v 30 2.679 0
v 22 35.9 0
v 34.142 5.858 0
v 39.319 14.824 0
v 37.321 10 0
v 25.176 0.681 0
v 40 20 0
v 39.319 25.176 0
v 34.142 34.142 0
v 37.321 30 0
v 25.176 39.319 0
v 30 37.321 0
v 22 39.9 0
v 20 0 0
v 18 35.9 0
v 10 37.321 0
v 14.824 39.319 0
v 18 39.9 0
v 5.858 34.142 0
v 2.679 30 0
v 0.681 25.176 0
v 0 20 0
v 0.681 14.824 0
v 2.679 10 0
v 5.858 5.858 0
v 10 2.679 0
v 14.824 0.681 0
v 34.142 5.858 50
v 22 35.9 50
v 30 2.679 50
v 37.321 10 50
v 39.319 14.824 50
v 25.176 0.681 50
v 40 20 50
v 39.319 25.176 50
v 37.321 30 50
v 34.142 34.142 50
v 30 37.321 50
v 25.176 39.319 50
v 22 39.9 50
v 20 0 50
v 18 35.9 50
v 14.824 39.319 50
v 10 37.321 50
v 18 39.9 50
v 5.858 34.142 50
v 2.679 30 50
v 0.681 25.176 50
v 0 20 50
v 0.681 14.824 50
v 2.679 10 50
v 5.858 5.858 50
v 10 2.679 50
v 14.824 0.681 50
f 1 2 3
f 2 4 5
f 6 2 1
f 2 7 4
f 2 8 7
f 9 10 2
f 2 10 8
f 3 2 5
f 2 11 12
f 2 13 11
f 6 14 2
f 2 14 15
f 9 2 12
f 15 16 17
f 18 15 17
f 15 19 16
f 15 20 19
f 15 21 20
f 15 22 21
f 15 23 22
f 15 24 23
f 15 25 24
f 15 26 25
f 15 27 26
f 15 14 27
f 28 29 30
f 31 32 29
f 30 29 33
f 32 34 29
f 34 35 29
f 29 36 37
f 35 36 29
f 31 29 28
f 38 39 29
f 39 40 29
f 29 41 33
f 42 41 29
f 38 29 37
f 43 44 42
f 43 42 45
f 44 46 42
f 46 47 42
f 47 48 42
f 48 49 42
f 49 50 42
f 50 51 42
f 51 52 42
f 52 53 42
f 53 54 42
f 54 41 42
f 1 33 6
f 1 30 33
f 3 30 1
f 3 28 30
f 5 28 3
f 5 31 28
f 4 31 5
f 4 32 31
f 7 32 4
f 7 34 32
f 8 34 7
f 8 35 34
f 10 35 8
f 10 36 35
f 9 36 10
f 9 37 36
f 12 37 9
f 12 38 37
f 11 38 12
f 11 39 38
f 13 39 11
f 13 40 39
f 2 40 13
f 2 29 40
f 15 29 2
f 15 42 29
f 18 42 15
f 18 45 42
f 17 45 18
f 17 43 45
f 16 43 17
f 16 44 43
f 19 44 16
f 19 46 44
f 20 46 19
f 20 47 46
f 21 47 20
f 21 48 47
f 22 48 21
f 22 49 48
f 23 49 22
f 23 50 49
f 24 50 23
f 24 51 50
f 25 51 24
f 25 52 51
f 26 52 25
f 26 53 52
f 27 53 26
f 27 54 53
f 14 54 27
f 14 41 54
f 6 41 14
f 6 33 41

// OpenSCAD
$fn = 32;

// ----------------------------------------------------------------------
// Keyway shaft: d40 shaft, key 4 x 4 mm
// ----------------------------------------------------------------------

// --- parameters (mm) ---
shaft_r = 20;             // shaft radius
key_w = 4;                // keyway width
key_d = 4;                // keyway depth below the surface line
plate_t = 50;             // shaft length, Z (extrusion height)

shaft_d = 2 * shaft_r;  // shaft diameter
circle_step = 15;  // polygon sampling step, degrees

profile = [[14.824, 39.319], [10, 37.321], [5.858, 34.142], [2.679, 30], [0.681, 25.176], [0, 20], [0.681, 14.824], [2.679, 10], [5.858, 5.858], [10, 2.679], [14.824, 0.681], [20, 0], [25.176, 0.681], [30, 2.679], [34.142, 5.858], [37.321, 10], [39.319, 14.824], [40, 20], [39.319, 25.176], [37.321, 30], [34.142, 34.142], [30, 37.321], [25.176, 39.319], [22, 39.9], [22, 35.9], [18, 35.9], [18, 39.9]];  // primary outline, 27 points, counter clockwise

// --- the one profile operation ---
linear_extrude(height = plate_t) polygon(points = profile);
